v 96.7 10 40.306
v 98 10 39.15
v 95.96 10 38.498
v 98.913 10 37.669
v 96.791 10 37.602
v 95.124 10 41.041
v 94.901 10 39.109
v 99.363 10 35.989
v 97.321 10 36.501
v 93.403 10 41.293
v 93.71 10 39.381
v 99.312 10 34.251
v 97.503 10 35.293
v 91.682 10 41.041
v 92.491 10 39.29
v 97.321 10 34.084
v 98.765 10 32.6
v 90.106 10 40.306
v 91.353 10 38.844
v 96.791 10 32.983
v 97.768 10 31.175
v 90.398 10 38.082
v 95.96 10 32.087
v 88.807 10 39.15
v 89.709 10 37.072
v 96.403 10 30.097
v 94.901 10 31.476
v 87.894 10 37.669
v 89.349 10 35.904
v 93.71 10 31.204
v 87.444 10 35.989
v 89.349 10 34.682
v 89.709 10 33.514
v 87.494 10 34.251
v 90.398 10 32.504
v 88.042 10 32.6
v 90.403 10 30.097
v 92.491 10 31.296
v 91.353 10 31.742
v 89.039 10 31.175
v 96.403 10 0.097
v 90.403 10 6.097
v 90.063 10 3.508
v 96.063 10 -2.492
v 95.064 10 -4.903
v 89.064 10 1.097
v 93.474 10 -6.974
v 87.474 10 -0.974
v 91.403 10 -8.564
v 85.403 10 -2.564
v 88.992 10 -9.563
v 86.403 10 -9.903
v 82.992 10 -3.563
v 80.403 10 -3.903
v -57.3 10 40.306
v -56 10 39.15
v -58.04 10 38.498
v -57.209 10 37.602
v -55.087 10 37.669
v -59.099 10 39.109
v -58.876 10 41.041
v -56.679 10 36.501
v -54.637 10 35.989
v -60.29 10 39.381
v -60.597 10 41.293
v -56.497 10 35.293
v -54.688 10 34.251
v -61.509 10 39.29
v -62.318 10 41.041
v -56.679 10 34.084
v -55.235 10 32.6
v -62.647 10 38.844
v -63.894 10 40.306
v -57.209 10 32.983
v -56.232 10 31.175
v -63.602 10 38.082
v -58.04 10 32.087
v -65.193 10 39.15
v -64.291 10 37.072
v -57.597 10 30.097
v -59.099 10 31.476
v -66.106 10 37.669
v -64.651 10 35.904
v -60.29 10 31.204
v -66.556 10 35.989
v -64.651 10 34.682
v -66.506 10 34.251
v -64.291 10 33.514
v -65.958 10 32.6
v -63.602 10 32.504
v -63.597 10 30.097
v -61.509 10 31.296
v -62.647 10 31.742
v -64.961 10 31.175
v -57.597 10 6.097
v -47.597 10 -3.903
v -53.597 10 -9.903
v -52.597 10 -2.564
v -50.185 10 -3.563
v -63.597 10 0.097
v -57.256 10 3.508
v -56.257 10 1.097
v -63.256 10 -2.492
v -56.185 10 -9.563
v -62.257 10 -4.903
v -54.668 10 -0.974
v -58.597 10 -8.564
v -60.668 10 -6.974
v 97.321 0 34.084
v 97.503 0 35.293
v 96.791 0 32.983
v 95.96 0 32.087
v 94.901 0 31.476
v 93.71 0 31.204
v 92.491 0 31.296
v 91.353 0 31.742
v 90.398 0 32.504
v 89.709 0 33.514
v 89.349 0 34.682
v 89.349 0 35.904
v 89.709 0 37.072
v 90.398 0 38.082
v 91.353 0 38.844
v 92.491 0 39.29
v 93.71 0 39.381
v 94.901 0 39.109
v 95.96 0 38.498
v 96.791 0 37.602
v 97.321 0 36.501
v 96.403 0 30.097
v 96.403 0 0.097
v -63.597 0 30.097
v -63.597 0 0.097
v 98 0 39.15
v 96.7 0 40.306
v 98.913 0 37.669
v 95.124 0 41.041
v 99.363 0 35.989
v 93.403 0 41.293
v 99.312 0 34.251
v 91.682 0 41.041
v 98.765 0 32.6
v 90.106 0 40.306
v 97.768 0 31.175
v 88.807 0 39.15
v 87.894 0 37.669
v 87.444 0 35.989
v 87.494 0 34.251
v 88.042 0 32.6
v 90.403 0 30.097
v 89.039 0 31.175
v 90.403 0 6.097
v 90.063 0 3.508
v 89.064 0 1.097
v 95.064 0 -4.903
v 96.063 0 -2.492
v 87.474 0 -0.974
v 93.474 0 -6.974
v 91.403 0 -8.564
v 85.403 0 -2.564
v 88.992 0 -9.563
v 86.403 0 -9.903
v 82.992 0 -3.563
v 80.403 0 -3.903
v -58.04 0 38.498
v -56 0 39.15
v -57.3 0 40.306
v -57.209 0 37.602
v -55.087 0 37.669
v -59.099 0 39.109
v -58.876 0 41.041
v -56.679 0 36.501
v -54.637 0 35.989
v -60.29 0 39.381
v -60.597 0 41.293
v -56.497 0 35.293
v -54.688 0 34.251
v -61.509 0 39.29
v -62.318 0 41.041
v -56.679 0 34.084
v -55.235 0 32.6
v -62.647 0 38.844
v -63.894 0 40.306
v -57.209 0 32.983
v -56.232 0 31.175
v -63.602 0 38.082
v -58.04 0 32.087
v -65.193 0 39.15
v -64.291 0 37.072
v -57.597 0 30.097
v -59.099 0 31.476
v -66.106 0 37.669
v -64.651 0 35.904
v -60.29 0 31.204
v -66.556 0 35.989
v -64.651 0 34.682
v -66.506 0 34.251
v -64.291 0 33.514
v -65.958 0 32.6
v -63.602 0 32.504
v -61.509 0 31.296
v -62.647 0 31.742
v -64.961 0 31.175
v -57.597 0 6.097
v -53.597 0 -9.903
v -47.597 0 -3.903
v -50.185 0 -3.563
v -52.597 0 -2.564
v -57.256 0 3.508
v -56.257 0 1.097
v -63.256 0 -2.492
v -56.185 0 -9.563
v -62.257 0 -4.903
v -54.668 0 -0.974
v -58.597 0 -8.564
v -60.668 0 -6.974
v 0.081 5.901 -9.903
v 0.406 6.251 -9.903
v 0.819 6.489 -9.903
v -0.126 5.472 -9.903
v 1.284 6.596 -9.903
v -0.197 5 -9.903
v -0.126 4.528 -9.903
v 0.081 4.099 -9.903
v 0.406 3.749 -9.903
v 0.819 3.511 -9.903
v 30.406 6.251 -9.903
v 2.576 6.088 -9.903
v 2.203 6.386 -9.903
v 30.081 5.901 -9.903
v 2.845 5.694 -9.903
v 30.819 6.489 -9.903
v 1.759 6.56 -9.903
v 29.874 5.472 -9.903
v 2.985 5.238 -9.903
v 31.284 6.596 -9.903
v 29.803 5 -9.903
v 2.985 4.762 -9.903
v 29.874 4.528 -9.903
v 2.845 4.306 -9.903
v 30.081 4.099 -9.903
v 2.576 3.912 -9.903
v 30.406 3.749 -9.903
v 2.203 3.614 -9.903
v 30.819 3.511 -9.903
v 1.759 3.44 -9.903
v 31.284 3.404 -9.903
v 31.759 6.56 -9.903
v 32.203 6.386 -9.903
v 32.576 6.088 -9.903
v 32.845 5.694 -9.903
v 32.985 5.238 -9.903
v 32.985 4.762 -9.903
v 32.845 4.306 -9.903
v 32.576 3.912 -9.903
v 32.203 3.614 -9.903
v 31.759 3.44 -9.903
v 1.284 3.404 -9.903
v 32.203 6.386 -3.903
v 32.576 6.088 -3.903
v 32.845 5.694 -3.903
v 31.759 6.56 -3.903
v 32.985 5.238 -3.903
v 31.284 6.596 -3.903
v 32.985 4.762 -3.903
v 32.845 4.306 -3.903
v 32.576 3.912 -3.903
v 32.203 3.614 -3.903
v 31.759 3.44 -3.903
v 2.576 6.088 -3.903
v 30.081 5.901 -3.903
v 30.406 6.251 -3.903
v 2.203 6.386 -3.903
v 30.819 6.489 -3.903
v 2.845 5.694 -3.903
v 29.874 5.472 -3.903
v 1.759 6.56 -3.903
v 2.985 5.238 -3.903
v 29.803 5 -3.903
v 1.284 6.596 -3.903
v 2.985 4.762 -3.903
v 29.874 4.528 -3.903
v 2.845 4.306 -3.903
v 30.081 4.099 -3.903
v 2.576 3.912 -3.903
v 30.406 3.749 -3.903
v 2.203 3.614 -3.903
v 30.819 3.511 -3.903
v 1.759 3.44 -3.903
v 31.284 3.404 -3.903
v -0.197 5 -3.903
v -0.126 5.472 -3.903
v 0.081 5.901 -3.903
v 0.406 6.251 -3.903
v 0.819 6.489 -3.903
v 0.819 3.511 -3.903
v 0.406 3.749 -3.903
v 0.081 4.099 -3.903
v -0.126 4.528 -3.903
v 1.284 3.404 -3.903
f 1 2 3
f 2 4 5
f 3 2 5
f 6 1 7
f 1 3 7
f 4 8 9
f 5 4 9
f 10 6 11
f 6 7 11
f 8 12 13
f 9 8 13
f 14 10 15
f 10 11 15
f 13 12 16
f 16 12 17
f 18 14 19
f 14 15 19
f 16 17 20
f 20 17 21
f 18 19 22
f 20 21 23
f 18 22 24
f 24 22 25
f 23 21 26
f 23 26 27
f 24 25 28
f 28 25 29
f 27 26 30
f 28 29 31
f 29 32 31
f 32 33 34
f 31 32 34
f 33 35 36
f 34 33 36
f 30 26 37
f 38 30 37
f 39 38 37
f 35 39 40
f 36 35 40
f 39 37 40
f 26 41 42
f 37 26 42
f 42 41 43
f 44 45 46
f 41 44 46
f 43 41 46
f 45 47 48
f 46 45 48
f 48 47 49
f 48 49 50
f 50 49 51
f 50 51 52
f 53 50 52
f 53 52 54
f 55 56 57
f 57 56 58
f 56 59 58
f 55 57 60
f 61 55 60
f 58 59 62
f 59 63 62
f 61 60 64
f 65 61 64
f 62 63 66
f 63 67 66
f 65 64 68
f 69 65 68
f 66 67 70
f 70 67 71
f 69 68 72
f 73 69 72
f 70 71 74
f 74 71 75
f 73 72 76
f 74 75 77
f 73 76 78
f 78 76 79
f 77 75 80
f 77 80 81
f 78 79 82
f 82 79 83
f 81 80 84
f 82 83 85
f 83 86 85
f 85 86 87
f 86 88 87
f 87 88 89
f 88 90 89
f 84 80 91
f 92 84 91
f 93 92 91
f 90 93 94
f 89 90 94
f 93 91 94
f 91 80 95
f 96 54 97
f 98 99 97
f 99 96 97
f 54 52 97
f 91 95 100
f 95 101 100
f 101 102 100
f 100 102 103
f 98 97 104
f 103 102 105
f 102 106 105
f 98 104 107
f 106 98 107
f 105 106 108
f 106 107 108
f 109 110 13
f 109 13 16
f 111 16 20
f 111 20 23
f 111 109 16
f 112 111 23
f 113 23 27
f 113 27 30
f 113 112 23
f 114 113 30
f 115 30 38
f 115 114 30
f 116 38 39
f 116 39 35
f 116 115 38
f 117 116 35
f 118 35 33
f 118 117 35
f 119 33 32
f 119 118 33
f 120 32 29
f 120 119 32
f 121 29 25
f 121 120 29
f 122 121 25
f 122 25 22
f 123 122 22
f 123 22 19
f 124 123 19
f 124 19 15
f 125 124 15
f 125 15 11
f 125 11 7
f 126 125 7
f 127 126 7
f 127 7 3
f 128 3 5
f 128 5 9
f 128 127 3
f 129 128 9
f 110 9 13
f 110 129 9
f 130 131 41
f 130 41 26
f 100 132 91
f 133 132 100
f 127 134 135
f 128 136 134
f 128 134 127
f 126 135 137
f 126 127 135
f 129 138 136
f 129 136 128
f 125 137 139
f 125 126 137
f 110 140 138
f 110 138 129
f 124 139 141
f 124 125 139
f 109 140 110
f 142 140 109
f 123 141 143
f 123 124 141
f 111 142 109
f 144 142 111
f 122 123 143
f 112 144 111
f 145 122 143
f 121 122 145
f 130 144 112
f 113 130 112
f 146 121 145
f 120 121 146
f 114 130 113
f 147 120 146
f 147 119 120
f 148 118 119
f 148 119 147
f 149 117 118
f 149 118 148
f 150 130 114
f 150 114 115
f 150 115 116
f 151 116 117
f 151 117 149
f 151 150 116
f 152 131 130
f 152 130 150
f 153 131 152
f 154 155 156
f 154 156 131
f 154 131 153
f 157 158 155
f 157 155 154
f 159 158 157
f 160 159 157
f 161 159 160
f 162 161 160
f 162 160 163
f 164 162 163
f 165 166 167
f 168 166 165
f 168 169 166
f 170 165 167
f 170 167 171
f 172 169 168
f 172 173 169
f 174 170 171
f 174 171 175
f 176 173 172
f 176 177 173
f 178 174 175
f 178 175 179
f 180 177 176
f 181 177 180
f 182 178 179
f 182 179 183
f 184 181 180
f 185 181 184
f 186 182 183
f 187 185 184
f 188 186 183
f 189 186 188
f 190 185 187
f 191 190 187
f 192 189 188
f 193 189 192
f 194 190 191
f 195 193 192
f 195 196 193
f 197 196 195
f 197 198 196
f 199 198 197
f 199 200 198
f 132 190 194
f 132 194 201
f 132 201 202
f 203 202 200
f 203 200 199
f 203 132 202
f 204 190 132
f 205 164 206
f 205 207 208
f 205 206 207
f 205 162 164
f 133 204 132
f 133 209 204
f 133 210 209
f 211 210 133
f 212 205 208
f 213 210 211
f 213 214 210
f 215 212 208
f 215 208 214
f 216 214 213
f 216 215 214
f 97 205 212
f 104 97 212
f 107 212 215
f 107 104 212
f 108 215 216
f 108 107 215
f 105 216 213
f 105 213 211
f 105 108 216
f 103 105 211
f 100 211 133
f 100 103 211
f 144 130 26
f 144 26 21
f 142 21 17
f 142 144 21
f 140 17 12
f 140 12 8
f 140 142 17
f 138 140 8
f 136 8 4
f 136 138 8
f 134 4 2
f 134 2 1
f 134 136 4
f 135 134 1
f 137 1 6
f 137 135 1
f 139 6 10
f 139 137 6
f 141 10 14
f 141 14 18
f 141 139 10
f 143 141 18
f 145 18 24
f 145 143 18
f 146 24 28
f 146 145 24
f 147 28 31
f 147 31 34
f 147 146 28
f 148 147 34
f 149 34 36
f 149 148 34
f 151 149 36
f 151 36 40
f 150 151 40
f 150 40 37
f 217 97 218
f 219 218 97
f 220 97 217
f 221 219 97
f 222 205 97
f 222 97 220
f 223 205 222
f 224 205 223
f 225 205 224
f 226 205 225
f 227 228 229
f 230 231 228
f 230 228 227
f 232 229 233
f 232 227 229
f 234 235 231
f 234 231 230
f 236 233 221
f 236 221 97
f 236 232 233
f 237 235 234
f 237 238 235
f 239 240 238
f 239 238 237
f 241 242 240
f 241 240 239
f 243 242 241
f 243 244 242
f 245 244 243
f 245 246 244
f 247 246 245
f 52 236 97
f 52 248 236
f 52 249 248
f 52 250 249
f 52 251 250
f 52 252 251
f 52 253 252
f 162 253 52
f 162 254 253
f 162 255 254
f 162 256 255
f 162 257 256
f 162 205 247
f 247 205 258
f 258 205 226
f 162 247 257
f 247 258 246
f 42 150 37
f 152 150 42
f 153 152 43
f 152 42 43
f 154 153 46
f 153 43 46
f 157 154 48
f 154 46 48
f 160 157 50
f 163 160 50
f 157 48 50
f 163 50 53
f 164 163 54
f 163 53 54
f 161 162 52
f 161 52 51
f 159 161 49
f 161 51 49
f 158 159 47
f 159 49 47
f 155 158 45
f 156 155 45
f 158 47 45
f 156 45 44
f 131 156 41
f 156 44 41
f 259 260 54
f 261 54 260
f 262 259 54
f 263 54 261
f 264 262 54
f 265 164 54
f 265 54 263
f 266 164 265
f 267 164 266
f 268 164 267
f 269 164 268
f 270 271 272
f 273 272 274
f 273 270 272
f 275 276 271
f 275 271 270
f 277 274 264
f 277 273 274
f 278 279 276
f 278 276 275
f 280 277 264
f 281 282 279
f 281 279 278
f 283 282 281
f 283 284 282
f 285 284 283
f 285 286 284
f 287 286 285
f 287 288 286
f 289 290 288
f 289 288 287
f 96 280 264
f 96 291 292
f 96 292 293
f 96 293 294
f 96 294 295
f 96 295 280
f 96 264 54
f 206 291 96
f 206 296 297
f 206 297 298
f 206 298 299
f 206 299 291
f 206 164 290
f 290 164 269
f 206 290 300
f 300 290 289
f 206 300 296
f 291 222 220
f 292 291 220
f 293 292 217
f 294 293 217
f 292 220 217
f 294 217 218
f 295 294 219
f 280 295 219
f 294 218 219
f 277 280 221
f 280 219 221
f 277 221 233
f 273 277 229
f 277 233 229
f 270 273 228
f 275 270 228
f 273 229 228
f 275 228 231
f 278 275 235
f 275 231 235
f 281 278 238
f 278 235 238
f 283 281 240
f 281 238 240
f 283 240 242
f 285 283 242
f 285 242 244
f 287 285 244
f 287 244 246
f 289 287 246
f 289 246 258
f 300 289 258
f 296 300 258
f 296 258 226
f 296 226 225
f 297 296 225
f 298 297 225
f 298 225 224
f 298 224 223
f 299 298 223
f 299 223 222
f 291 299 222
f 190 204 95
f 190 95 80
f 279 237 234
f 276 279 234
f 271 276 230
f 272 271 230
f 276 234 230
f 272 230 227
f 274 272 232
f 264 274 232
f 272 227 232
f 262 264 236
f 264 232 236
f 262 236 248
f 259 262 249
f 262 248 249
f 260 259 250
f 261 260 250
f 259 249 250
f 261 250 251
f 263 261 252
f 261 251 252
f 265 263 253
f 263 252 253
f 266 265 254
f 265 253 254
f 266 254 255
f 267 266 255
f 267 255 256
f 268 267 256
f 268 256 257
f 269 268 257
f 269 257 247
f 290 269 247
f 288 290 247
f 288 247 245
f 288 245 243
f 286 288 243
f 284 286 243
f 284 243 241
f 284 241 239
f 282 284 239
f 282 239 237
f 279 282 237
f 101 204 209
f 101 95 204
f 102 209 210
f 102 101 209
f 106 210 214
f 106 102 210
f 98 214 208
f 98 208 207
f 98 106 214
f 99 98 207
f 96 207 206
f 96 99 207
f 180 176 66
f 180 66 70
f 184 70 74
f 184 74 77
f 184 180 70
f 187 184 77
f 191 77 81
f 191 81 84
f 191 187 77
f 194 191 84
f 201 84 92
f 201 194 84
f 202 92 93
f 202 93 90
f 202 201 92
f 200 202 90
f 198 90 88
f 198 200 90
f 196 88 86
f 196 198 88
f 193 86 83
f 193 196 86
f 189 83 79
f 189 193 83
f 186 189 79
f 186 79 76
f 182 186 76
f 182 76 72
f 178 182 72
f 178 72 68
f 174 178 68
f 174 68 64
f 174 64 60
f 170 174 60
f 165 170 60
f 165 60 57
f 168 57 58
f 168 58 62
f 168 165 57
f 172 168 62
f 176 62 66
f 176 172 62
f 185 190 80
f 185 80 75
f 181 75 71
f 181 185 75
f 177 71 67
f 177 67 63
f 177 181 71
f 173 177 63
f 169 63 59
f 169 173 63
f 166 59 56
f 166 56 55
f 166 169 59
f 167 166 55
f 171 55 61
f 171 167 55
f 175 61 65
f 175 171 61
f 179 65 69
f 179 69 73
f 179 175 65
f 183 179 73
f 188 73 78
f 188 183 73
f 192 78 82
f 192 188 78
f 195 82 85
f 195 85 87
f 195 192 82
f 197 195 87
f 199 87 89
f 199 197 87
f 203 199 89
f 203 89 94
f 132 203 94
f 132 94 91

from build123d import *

# Parameters (mm, degrees)
SKETCH_1_R          = 4.1
EXTRUDE_1_DEPTH     = 10
SKETCH_3_R          = 1.6
CUT_EXTRUDE_1_DEPTH = 52.196152423
FILLET_1_R          = 10


with BuildPart() as part:
    # Эскиз1 → Бобышка-Вытянуть1 (new body)
    with BuildSketch(Plane(origin=(0, 0, 0), x_dir=(1, 0, 0), z_dir=(0, 1, 0))):
        with BuildLine():
            Line((-63.596685083, 9.903314917), (96.403314917, 9.903314917))
            Line((96.403314917, 9.903314917), (96.403314917, -30.096685083))
            ThreePointArc((96.403314917, -30.096685083), (93.403314917, -41.292837506), (90.403314917, -30.096685083))
            Line((90.403314917, -30.096685083), (90.403314917, 3.903314917))
            Line((90.403314917, 3.903314917), (-57.596685083, 3.903314917))
            Line((-57.596685083, 3.903314917), (-57.596685083, -30.096685083))
            ThreePointArc((-57.596685083, -30.096685083), (-60.596685083, -41.292837506), (-63.596685083, -30.096685083))
            Line((-63.596685083, -30.096685083), (-63.596685083, 9.903314917))
        make_face()
        with Locations((-60.596685083, -35.292837506)):
            Circle(SKETCH_1_R, mode=Mode.SUBTRACT)
        with Locations((93.403314917, -35.292837506)):
            Circle(SKETCH_1_R, mode=Mode.SUBTRACT)
    extrude(amount=EXTRUDE_1_DEPTH)

    # Эскиз3 → Вырез-Вытянуть1 (cut, through all)
    with BuildSketch(Plane(origin=(0, 0, -9.903314917), x_dir=(-1, 0, 0), z_dir=(0, 0, -1))):
        with Locations((-1.403314917, 5)):
            Circle(SKETCH_3_R)
        with Locations((-31.403314917, 5)):
            Circle(SKETCH_3_R)
    extrude(amount=-CUT_EXTRUDE_1_DEPTH, mode=Mode.SUBTRACT)

    # Скругление1
    fillet_1_edges = [part.edges().sort_by_distance(p)[0] for p in [
        (-63.596685083, 5, -9.903314917),
        (96.403314917, 5, -9.903314917),
        (90.403314917, 5, -3.903314917),
        (-57.596685083, 5, -3.903314917),
    ]]
    fillet(fillet_1_edges, radius=FILLET_1_R)


solid = part.part
